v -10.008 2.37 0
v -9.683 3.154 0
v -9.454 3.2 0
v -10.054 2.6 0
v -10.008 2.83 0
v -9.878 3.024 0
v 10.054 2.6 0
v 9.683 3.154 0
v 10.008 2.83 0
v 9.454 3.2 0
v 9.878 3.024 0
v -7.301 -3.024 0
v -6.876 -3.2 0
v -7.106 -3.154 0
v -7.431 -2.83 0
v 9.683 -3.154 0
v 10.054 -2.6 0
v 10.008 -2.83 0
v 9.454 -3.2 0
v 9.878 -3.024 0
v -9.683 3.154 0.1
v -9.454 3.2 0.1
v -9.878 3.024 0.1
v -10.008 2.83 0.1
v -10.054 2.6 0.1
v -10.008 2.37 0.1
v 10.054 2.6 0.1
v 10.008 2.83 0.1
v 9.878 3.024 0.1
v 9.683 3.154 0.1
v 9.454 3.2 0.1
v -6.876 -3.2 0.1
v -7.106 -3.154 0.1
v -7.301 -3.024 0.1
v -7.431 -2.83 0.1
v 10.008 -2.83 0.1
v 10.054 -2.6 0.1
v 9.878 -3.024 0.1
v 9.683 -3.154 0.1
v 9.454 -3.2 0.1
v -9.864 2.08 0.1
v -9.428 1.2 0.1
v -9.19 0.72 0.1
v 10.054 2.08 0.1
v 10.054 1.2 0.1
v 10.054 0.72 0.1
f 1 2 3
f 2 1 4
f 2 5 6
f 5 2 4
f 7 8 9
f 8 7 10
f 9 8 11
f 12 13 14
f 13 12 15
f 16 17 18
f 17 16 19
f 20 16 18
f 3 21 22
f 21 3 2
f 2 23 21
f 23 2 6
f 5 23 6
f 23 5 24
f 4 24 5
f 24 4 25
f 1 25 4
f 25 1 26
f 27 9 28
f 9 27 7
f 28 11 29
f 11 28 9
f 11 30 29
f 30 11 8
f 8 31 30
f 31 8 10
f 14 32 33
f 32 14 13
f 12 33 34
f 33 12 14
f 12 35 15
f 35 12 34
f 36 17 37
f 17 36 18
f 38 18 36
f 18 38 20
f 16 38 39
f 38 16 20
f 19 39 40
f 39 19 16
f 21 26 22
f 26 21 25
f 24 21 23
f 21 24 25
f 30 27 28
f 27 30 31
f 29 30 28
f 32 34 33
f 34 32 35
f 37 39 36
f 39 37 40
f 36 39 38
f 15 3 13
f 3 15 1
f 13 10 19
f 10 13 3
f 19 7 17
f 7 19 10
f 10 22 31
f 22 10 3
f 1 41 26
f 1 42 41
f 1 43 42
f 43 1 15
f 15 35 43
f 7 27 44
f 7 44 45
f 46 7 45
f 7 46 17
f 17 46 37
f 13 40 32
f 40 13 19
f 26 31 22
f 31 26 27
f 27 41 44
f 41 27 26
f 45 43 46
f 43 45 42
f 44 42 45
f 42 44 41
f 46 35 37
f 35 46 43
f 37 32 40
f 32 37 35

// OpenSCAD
// file: ../p/5-16cyli.scad
use <../lib.scad>
function ldraw_lib__5_16cyli() = [
// 0 Cylinder 0.3125
// 0 Name: 5-16cyli.dat
// 0 Author: Philippe Hurbain [Philo]
// 0 !LDRAW_ORG Primitive UPDATE 2009-03
// 0 !LICENSE Licensed under CC BY 4.0 : see CAreadme.txt
// 
// 0 BFC CERTIFY CCW
  [0,"BFC","CERTIFY"],
  [0,"BFC","CCW"],
// 
// 0 !HISTORY 2009-12-29 [PTadmin] Official Update 2009-03
// 
// 
// 4 16 0.9239 0 0.3827 1 0 0 1 1 0 0.9239 1 0.3827
  [4,16,0.9239,0,0.3827,1,0,0,1,1,0,0.9239,1,0.3827],
// 4 16 0.7071 0 0.7071 0.9239 0 0.3827 0.9239 1 0.3827 0.7071 1 0.7071
  [4,16,0.7071,0,0.7071,0.9239,0,0.3827,0.9239,1,0.3827,0.7071,1,0.7071],
// 4 16 0.3827 0 0.9239 0.7071 0 0.7071 0.7071 1 0.7071 0.3827 1 0.9239
  [4,16,0.3827,0,0.9239,0.7071,0,0.7071,0.7071,1,0.7071,0.3827,1,0.9239],
// 4 16 0 0 1 0.3827 0 0.9239 0.3827 1 0.9239 0 1 1
  [4,16,0,0,1,0.3827,0,0.9239,0.3827,1,0.9239,0,1,1],
// 4 16 -0.3827 0 0.9239 0 0 1 0 1 1 -0.3827 1 0.9239
  [4,16,-0.3827,0,0.9239,0,0,1,0,1,1,-0.3827,1,0.9239],
// 
// 0 // conditional lines
// 5 24 1 1 0 1 0 0 1 1 -0.4142 0.9239 1 0.3827
  [5,24,1,1,0,1,0,0,1,1,-0.4142,0.9239,1,0.3827],
// 5 24 0.9239 1 0.3827 0.9239 0 0.3827 1 1 0 0.7071 1 0.7071
  [5,24,0.9239,1,0.3827,0.9239,0,0.3827,1,1,0,0.7071,1,0.7071],
// 5 24 0.7071 1 0.7071 0.7071 0 0.7071 0.9239 1 0.3827 0.3827 1 0.9239
  [5,24,0.7071,1,0.7071,0.7071,0,0.7071,0.9239,1,0.3827,0.3827,1,0.9239],
// 5 24 0.3827 1 0.9239 0.3827 0 0.9239 0.7071 1 0.7071 0 1 1
  [5,24,0.3827,1,0.9239,0.3827,0,0.9239,0.7071,1,0.7071,0,1,1],
// 5 24 0 1 1 0 0 1 0.3827 1 0.9239 -0.3827 1 0.9239
  [5,24,0,1,1,0,0,1,0.3827,1,0.9239,-0.3827,1,0.9239],
// 5 24 -0.3827 1 0.9239 -0.3827 0 0.9239 0 1 1 -0.7654 1 0.7654
  [5,24,-0.3827,1,0.9239,-0.3827,0,0.9239,0,1,1,-0.7654,1,0.7654],
// 
// 0 // end of file
// 
];
module ldraw_lib__5_16cyli(step=0, col=false, unit=2/5, alt=false, line=0.2, solid=!$preview)
    makepoly(ldraw_lib__5_16cyli(), step=step, col=col, unit=unit, alt=alt, line=line, solid=solid);
ldraw_lib__5_16cyli(line=0.2);
// file: ../p/5-16chrd.scad
use <../lib.scad>
function ldraw_lib__5_16chrd() = [
// 0 Chord 0.3125
// 0 Name: 5-16chrd.dat
// 0 Author: Niels Karsdorp [nielsk]
// 0 !LDRAW_ORG Primitive UPDATE 2010-01
// 0 !LICENSE Licensed under CC BY 4.0 : see CAreadme.txt
// 
// 0 BFC CERTIFY CCW
  [0,"BFC","CERTIFY"],
  [0,"BFC","CCW"],
// 
// 0 !HISTORY 2010-04-05 [PTadmin] Official Update 2010-01
// 
// 
// 4 16 1 0 0 0.9239 0 0.3827 0 0 1 -0.3827 0 0.9239
  [4,16,1,0,0,0.9239,0,0.3827,0,0,1,-0.3827,0,0.9239],
// 4 16 0.9239 0 0.3827 0.7071 0 0.7071 0.3827 0 0.9239 0 0 1
  [4,16,0.9239,0,0.3827,0.7071,0,0.7071,0.3827,0,0.9239,0,0,1],
// 0
// 
];
module ldraw_lib__5_16chrd(step=0, col=false, unit=2/5, alt=false, line=0.2, solid=!$preview)
    makepoly(ldraw_lib__5_16chrd(), step=step, col=col, unit=unit, alt=alt, line=line, solid=solid);
ldraw_lib__5_16chrd(line=0.2);
// file: ../p/3-16cyli.scad
use <../lib.scad>
function ldraw_lib__3_16cyli() = [
// 0 Cylinder 0.1875
// 0 Name: 3-16cyli.dat
// 0 Author: Mark Kennedy [mkennedy]
// 0 !LDRAW_ORG Primitive UPDATE 2005-01
// 0 !LICENSE Licensed under CC BY 4.0 : see CAreadme.txt
// 
// 0 BFC CERTIFY CCW
  [0,"BFC","CERTIFY"],
  [0,"BFC","CCW"],
// 
// 0 !HISTORY 2004-03-02 [PTadmin] Official Update 2004-01
// 0 !HISTORY 2004-12-11 [nielsk] Recreated using Primitive Generator, Edge lines fixed, BFC changed to CCW
// 0 !HISTORY 2005-12-28 [PTadmin] Official Update 2005-01
// 0 !HISTORY 2007-06-24 [PTadmin] Header formatted for Contributor Agreement
// 0 !HISTORY 2008-07-01 [PTadmin] Official Update 2008-01
// 
// 
// 4 16 .9239 1 .3827 .9239 0 .3827 1 0 0 1 1 0
  [4,16,.9239,1,.3827,.9239,0,.3827,1,0,0,1,1,0],
// 4 16 .7071 1 .7071 .7071 0 .7071 .9239 0 .3827 .9239 1 .3827
  [4,16,.7071,1,.7071,.7071,0,.7071,.9239,0,.3827,.9239,1,.3827],
// 4 16 .3827 1 .9239 .3827 0 .9239 .7071 0 .7071 .7071 1 .7071
  [4,16,.3827,1,.9239,.3827,0,.9239,.7071,0,.7071,.7071,1,.7071],
// 5 24 1 1 0 1 0 0 1 1 -.4142 .9239 1 .3827
  [5,24,1,1,0,1,0,0,1,1,-.4142,.9239,1,.3827],
// 5 24 .9239 1 .3827 .9239 0 .3827 1 1 0 .7071 1 .7071
  [5,24,.9239,1,.3827,.9239,0,.3827,1,1,0,.7071,1,.7071],
// 5 24 .7071 1 .7071 .7071 0 .7071 .9239 1 .3827 .3827 1 .9239
  [5,24,.7071,1,.7071,.7071,0,.7071,.9239,1,.3827,.3827,1,.9239],
// 5 24 .3827 1 .9239 .3827 0 .9239 .7071 1 .7071 0 1 1.0824
  [5,24,.3827,1,.9239,.3827,0,.9239,.7071,1,.7071,0,1,1.0824],
// 0
];
module ldraw_lib__3_16cyli(step=0, col=false, unit=2/5, alt=false, line=0.2, solid=!$preview)
    makepoly(ldraw_lib__3_16cyli(), step=step, col=col, unit=unit, alt=alt, line=line, solid=solid);
ldraw_lib__3_16cyli(line=0.2);
// file: ../p/3-16chrd.scad
use <../lib.scad>
function ldraw_lib__3_16chrd() = [
// 0 Chord 0.1875
// 0 Name: 3-16chrd.dat
// 0 Author: Niels Karsdorp [nielsk]
// 0 !LDRAW_ORG Primitive UPDATE 2009-01
// 0 !LICENSE Licensed under CC BY 4.0 : see CAreadme.txt
// 
// 0 BFC CERTIFY CCW
  [0,"BFC","CERTIFY"],
  [0,"BFC","CCW"],
// 
// 0 !HISTORY 2009-05-02 [PTadmin] Official Update 2009-01
// 
// 
// 4 16 1 0 0 0.9239 0 0.3827 0.7071 0 0.7071 0.3827 0 0.9239
  [4,16,1,0,0,0.9239,0,0.3827,0.7071,0,0.7071,0.3827,0,0.9239],
// 0
// 
];
module ldraw_lib__3_16chrd(step=0, col=false, unit=2/5, alt=false, line=0.2, solid=!$preview)
    makepoly(ldraw_lib__3_16chrd(), step=step, col=col, unit=unit, alt=alt, line=line, solid=solid);
ldraw_lib__3_16chrd(line=0.2);
// file: ../p/1-4cyli.scad
use <../lib.scad>
function ldraw_lib__1_4cyli() = [
// 0 Cylinder 0.25
// 0 Name: 1-4cyli.dat
// 0 Author: James Jessiman
// 0 !LDRAW_ORG Primitive UPDATE 2012-01
// 0 !LICENSE Licensed under CC BY 4.0 : see CAreadme.txt
// 
// 0 BFC CERTIFY CCW
  [0,"BFC","CERTIFY"],
  [0,"BFC","CCW"],
// 
// 0 !HISTORY 2002-03-23 [sbliss] Added BFC statement.
// 0 !HISTORY 2002-04-25 [PTadmin] Official Update 2002-02
// 0 !HISTORY 2007-06-22 [PTadmin] Header formatted for Contributor Agreement
// 0 !HISTORY 2008-07-01 [PTadmin] Official Update 2008-01
// 0 !HISTORY 2012-02-16 [Philo] Changed to CCW
// 0 !HISTORY 2012-03-30 [PTadmin] Official Update 2012-01
// 
// 
// 4 16 1 1 0 0.9239 1 0.3827 0.9239 0 0.3827 1 0 0
  [4,16,1,1,0,0.9239,1,0.3827,0.9239,0,0.3827,1,0,0],
// 5 24 1 0 0 1 1 0 0.9239 0 0.3827 1 0 -1
  [5,24,1,0,0,1,1,0,0.9239,0,0.3827,1,0,-1],
// 4 16 0.9239 1 0.3827 0.7071 1 0.7071 0.7071 0 0.7071 0.9239 0 0.3827
  [4,16,0.9239,1,0.3827,0.7071,1,0.7071,0.7071,0,0.7071,0.9239,0,0.3827],
// 5 24 0.9239 0 0.3827 0.9239 1 0.3827 0.7071 0 0.7071 1 0 0
  [5,24,0.9239,0,0.3827,0.9239,1,0.3827,0.7071,0,0.7071,1,0,0],
// 4 16 0.7071 1 0.7071 0.3827 1 0.9239 0.3827 0 0.9239 0.7071 0 0.7071
  [4,16,0.7071,1,0.7071,0.3827,1,0.9239,0.3827,0,0.9239,0.7071,0,0.7071],
// 5 24 0.7071 0 0.7071 0.7071 1 0.7071 0.3827 0 0.9239 0.9239 0 0.3827
  [5,24,0.7071,0,0.7071,0.7071,1,0.7071,0.3827,0,0.9239,0.9239,0,0.3827],
// 4 16 0.3827 1 0.9239 0 1 1 0 0 1 0.3827 0 0.9239
  [4,16,0.3827,1,0.9239,0,1,1,0,0,1,0.3827,0,0.9239],
// 5 24 0.3827 0 0.9239 0.3827 1 0.9239 0 0 1 0.7071 0 0.7071
  [5,24,0.3827,0,0.9239,0.3827,1,0.9239,0,0,1,0.7071,0,0.7071],
// 5 24 0 0 1 0 1 1 0.3827 0 0.9239 -1 0 1
  [5,24,0,0,1,0,1,1,0.3827,0,0.9239,-1,0,1],
];
module ldraw_lib__1_4cyli(step=0, col=false, unit=2/5, alt=false, line=0.2, solid=!$preview)
    makepoly(ldraw_lib__1_4cyli(), step=step, col=col, unit=unit, alt=alt, line=line, solid=solid);
ldraw_lib__1_4cyli(line=0.2);
// file: ../p/1-4chrd.scad
use <../lib.scad>
function ldraw_lib__1_4chrd() = [
// 0 Chord 0.25
// 0 Name: 1-4chrd.dat
// 0 Author: Max Martin Richter [MMR1988]
// 0 !LDRAW_ORG Primitive UPDATE 2023-05
// 0 !LICENSE Licensed under CC BY 4.0 : see CAreadme.txt
// 
// 0 BFC CERTIFY CCW
  [0,"BFC","CERTIFY"],
  [0,"BFC","CCW"],
// 
// 0 !HISTORY 2004-04-22 [PTadmin] Official Update 2004-02
// 0 !HISTORY 2007-10-09 [PTadmin] Header formatted for Contributor Agreement
// 0 !HISTORY 2008-07-01 [PTadmin] Official Update 2008-01
// 0 !HISTORY 2012-08-02 [MMR1988] Re-creation with PrimGen2 and Rectifier
// 0 !HISTORY 2012-08-09 [PTadmin] Official Update 2012-02
// 0 !HISTORY 2023-10-27 [OrionP] Change author to MMR1988 from hafhead
// 0 !HISTORY 2023-10-31 [OrionP] Official Update 2023-05
// 
// 4 16 0.9239 0 0.3827 0.3827 0 0.9239 0 0 1 1 0 0
  [4,16,0.9239,0,0.3827,0.3827,0,0.9239,0,0,1,1,0,0],
// 3 16 0.7071 0 0.7071 0.3827 0 0.9239 0.9239 0 0.3827
  [3,16,0.7071,0,0.7071,0.3827,0,0.9239,0.9239,0,0.3827],
];
module ldraw_lib__1_4chrd(step=0, col=false, unit=2/5, alt=false, line=0.2, solid=!$preview)
    makepoly(ldraw_lib__1_4chrd(), step=step, col=col, unit=unit, alt=alt, line=line, solid=solid);
ldraw_lib__1_4chrd(line=0.2);
// main file
use <../lib.scad>
use <../p/1-4chrd.scad>
use <../p/1-4cyli.scad>
use <../p/3-16chrd.scad>
use <../p/3-16cyli.scad>
use <../p/5-16chrd.scad>
use <../p/5-16cyli.scad>
function ldraw_lib__6177741k() = [
// 0 Sticker  0.8 x  2.5 with Yellow Stripes on Transparent Background Right
// 0 Name: 6177741k.dat
// 0 Author: Massimo Maso [Sirio]
// 0 !LDRAW_ORG Part UPDATE 2025-05
// 0 !LICENSE Licensed under CC BY 4.0 : see CAreadme.txt
// 
// 0 BFC CERTIFY CCW
  [0,"BFC","CERTIFY"],
  [0,"BFC","CCW"],
// 
// 0 !KEYWORDS AMG, GT3, Mercedes, Set 75877, Speed Champions
// 
// 0 !HISTORY 2025-05-28 [OrionP] Official Update 2025-05
// 
// 0 // Primitives
// 1 16 -23.6341 0 6.5 0 0 -1.5 0 -1 0 1.5 0 0 5-16chrd.dat
  [1,16,-23.6341,0,6.5,0,0,-1.5,0,-1,0,1.5,0,0, ldraw_lib__5_16chrd()],
// 1 16 23.6341 0 6.5 1.5 0 0 0 -1 0 0 0 1.5 1-4chrd.dat
  [1,16,23.6341,0,6.5,1.5,0,0,0,-1,0,0,0,1.5, ldraw_lib__1_4chrd()],
// 1 16 -17.1908 0 -6.5 0 0 -1.5 0 -1 0 -1.5 0 0 3-16chrd.dat
  [1,16,-17.1908,0,-6.5,0,0,-1.5,0,-1,0,-1.5,0,0, ldraw_lib__3_16chrd()],
// 1 16 23.6341 0 -6.5 1.5 0 0 0 -1 0 0 0 -1.5 1-4chrd.dat
  [1,16,23.6341,0,-6.5,1.5,0,0,0,-1,0,0,0,-1.5, ldraw_lib__1_4chrd()],
// 1 16 -23.6341 0 6.5 0 0 -1.5 0 -.25 0 1.5 0 0 5-16cyli.dat
  [1,16,-23.6341,0,6.5,0,0,-1.5,0,-.25,0,1.5,0,0, ldraw_lib__5_16cyli()],
// 1 16 23.6341 0 6.5 1.5 0 0 0 -.25 0 0 0 1.5 1-4cyli.dat
  [1,16,23.6341,0,6.5,1.5,0,0,0,-.25,0,0,0,1.5, ldraw_lib__1_4cyli()],
// 1 16 -17.1908 0 -6.5 0 0 -1.5 0 -.25 0 -1.5 0 0 3-16cyli.dat
  [1,16,-17.1908,0,-6.5,0,0,-1.5,0,-.25,0,-1.5,0,0, ldraw_lib__3_16cyli()],
// 1 16 23.6341 0 -6.5 1.5 0 0 0 -.25 0 0 0 -1.5 1-4cyli.dat
  [1,16,23.6341,0,-6.5,1.5,0,0,0,-.25,0,0,0,-1.5, ldraw_lib__1_4cyli()],
// 1 16 -23.6341 -.25 6.5 0 0 -1.5 0 1 0 1.5 0 0 5-16chrd.dat
  [1,16,-23.6341,-.25,6.5,0,0,-1.5,0,1,0,1.5,0,0, ldraw_lib__5_16chrd()],
// 1 16 23.6341 -.25 6.5 1.5 0 0 0 1 0 0 0 1.5 1-4chrd.dat
  [1,16,23.6341,-.25,6.5,1.5,0,0,0,1,0,0,0,1.5, ldraw_lib__1_4chrd()],
// 0 BFC NOCLIP
  [0,"BFC","NOCLIP"],
// 1 14 -17.1908 -.25 -6.5 0 0 -1.5 0 1 0 -1.5 0 0 3-16chrd.dat
  [1,14,-17.1908,-.25,-6.5,0,0,-1.5,0,1,0,-1.5,0,0, ldraw_lib__3_16chrd()],
// 1 14 23.6341 -.25 -6.5 1.5 0 0 0 1 0 0 0 -1.5 1-4chrd.dat
  [1,14,23.6341,-.25,-6.5,1.5,0,0,0,1,0,0,0,-1.5, ldraw_lib__1_4chrd()],
// 0 BFC CLIP
  [0,"BFC","CLIP"],
// 0 // Bottom face
// 4 16 -23.6341 0 8 -17.1908 0 -8 -18.57665 0 -7.07405 -25.01995 0 5.92595
  [4,16,-23.6341,0,8,-17.1908,0,-8,-18.57665,0,-7.07405,-25.01995,0,5.92595],
// 4 16 -23.6341 0 8 23.6341 0 8 23.6341 0 -8 -17.1908 0 -8
  [4,16,-23.6341,0,8,23.6341,0,8,23.6341,0,-8,-17.1908,0,-8],
// 4 16 23.6341 0 8 25.1341 0 6.5 25.1341 0 -6.5 23.6341 0 -8
  [4,16,23.6341,0,8,25.1341,0,6.5,25.1341,0,-6.5,23.6341,0,-8],
// 0 // Lateral face
// 4 16 -23.6341 0 8 -23.6341 -.25 8 23.6341 -.25 8 23.6341 0 8
  [4,16,-23.6341,0,8,-23.6341,-.25,8,23.6341,-.25,8,23.6341,0,8],
// 3 16 -25.01995 0 5.92595 -24.6601 -.25 5.2 -25.01995 -.25 5.92595
  [3,16,-25.01995,0,5.92595,-24.6601,-.25,5.2,-25.01995,-.25,5.92595],
// 3 16 -25.01995 0 5.92595 -23.5697 -.25 3 -24.6601 -.25 5.2
  [3,16,-25.01995,0,5.92595,-23.5697,-.25,3,-24.6601,-.25,5.2],
// 4 16 -18.57665 0 -7.07405 -22.975 -.25 1.8 -23.5697 -.25 3 -25.01995 0 5.92595
  [4,16,-18.57665,0,-7.07405,-22.975,-.25,1.8,-23.5697,-.25,3,-25.01995,0,5.92595],
// 3 16 -18.57665 0 -7.07405 -18.57665 -.25 -7.07405 -22.975 -.25 1.8
  [3,16,-18.57665,0,-7.07405,-18.57665,-.25,-7.07405,-22.975,-.25,1.8],
// 3 16 25.1341 0 6.5 25.1341 -.25 6.5 25.1341 -.25 5.2
  [3,16,25.1341,0,6.5,25.1341,-.25,6.5,25.1341,-.25,5.2],
// 3 16 25.1341 0 6.5 25.1341 -.25 5.2 25.1341 -.25 3
  [3,16,25.1341,0,6.5,25.1341,-.25,5.2,25.1341,-.25,3],
// 4 16 25.1341 0 -6.5 25.1341 0 6.5 25.1341 -.25 3 25.1341 -.25 1.8
  [4,16,25.1341,0,-6.5,25.1341,0,6.5,25.1341,-.25,3,25.1341,-.25,1.8],
// 3 16 25.1341 0 -6.5 25.1341 -.25 1.8 25.1341 -.25 -6.5
  [3,16,25.1341,0,-6.5,25.1341,-.25,1.8,25.1341,-.25,-6.5],
// 4 16 -17.1908 0 -8 23.6341 0 -8 23.6341 -.25 -8 -17.1908 -.25 -8
  [4,16,-17.1908,0,-8,23.6341,0,-8,23.6341,-.25,-8,-17.1908,-.25,-8],
// 0 // Top face
// 0 // Neutral faces
// 0 // First stirpe faces
// 4 16 -25.01995 -.25 5.92595 25.1341 -.25 6.5 23.6341 -.25 8 -23.6341 -.25 8
  [4,16,-25.01995,-.25,5.92595,25.1341,-.25,6.5,23.6341,-.25,8,-23.6341,-.25,8],
// 4 16 -25.01995 -.25 5.92595 -24.6601 -.25 5.2 25.1341 -.25 5.2 25.1341 -.25 6.5
  [4,16,-25.01995,-.25,5.92595,-24.6601,-.25,5.2,25.1341,-.25,5.2,25.1341,-.25,6.5],
// 0 // Second stripe faces
// 4 16 -23.5697 -.25 3 -22.975 -.25 1.8 25.1341 -.25 1.8 25.1341 -.25 3
  [4,16,-23.5697,-.25,3,-22.975,-.25,1.8,25.1341,-.25,1.8,25.1341,-.25,3],
// 0 BFC NOCLIP
  [0,"BFC","NOCLIP"],
// 0 // Yellow faces
// 0 // First stirpe faces
// 4 14 -23.5697 -.25 3 25.1341 -.25 3 25.1341 -.25 5.2 -24.6601 -.25 5.2
  [4,14,-23.5697,-.25,3,25.1341,-.25,3,25.1341,-.25,5.2,-24.6601,-.25,5.2],
// 0 // Second stripe faces
// 4 14 -18.57665 -.25 -7.07405 25.1341 -.25 -6.5 25.1341 -.25 1.8 -22.975 -.25 1.8
  [4,14,-18.57665,-.25,-7.07405,25.1341,-.25,-6.5,25.1341,-.25,1.8,-22.975,-.25,1.8],
// 4 14 -18.57665 -.25 -7.07405 -17.1908 -.25 -8 23.6341 -.25 -8 25.1341 -.25 -6.5
  [4,14,-18.57665,-.25,-7.07405,-17.1908,-.25,-8,23.6341,-.25,-8,25.1341,-.25,-6.5],
];
module ldraw_lib__6177741k(step=0, col=false, unit=2/5, alt=false, line=0.2, solid=!$preview)
    makepoly(ldraw_lib__6177741k(), step=step, col=col, unit=unit, alt=alt, line=line, solid=solid);
ldraw_lib__6177741k(line=0.2);
